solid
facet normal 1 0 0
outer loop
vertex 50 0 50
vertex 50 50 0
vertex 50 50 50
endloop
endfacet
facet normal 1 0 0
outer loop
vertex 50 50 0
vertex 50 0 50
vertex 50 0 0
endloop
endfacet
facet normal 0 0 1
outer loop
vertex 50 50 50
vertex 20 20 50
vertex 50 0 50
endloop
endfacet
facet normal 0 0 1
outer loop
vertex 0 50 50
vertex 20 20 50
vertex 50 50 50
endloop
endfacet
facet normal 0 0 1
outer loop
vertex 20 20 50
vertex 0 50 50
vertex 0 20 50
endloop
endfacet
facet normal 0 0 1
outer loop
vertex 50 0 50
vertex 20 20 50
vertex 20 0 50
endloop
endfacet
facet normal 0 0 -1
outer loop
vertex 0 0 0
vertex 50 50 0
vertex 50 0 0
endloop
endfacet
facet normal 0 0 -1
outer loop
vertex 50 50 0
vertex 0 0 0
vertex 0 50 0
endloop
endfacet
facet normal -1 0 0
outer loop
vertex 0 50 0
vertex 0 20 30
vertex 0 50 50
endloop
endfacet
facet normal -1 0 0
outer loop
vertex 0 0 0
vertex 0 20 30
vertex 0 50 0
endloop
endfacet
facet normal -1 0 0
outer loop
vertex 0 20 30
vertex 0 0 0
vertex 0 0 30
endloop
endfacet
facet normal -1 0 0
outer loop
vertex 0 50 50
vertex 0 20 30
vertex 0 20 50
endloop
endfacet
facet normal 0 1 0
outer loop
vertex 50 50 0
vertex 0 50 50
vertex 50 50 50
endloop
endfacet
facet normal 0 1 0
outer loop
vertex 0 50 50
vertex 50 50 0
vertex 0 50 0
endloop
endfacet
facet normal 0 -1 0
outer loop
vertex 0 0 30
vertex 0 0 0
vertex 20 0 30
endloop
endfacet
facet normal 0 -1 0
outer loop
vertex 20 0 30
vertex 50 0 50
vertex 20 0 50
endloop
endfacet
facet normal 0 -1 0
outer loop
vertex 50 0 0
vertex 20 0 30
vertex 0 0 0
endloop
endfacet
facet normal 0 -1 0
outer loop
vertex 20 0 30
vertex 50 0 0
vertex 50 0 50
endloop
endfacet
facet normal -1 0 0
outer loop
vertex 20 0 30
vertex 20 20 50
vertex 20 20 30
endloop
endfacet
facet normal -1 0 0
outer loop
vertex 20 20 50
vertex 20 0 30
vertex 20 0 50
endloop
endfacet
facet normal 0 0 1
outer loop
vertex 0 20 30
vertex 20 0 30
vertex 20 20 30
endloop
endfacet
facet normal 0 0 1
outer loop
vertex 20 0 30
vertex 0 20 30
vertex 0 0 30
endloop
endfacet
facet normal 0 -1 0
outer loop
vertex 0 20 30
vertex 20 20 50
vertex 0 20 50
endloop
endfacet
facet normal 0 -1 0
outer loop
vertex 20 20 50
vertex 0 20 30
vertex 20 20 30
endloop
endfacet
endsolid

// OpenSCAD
extruder = 0; //0 or 1.

module cutout() {
	translate([0, 0, 30]) {
		cube(20);
	}
}

if(extruder == 0) {
	difference() {
		cube(50);
		cutout();
	}
} else {
	color([1, 0, 0]) {
		cutout();
	}
}
